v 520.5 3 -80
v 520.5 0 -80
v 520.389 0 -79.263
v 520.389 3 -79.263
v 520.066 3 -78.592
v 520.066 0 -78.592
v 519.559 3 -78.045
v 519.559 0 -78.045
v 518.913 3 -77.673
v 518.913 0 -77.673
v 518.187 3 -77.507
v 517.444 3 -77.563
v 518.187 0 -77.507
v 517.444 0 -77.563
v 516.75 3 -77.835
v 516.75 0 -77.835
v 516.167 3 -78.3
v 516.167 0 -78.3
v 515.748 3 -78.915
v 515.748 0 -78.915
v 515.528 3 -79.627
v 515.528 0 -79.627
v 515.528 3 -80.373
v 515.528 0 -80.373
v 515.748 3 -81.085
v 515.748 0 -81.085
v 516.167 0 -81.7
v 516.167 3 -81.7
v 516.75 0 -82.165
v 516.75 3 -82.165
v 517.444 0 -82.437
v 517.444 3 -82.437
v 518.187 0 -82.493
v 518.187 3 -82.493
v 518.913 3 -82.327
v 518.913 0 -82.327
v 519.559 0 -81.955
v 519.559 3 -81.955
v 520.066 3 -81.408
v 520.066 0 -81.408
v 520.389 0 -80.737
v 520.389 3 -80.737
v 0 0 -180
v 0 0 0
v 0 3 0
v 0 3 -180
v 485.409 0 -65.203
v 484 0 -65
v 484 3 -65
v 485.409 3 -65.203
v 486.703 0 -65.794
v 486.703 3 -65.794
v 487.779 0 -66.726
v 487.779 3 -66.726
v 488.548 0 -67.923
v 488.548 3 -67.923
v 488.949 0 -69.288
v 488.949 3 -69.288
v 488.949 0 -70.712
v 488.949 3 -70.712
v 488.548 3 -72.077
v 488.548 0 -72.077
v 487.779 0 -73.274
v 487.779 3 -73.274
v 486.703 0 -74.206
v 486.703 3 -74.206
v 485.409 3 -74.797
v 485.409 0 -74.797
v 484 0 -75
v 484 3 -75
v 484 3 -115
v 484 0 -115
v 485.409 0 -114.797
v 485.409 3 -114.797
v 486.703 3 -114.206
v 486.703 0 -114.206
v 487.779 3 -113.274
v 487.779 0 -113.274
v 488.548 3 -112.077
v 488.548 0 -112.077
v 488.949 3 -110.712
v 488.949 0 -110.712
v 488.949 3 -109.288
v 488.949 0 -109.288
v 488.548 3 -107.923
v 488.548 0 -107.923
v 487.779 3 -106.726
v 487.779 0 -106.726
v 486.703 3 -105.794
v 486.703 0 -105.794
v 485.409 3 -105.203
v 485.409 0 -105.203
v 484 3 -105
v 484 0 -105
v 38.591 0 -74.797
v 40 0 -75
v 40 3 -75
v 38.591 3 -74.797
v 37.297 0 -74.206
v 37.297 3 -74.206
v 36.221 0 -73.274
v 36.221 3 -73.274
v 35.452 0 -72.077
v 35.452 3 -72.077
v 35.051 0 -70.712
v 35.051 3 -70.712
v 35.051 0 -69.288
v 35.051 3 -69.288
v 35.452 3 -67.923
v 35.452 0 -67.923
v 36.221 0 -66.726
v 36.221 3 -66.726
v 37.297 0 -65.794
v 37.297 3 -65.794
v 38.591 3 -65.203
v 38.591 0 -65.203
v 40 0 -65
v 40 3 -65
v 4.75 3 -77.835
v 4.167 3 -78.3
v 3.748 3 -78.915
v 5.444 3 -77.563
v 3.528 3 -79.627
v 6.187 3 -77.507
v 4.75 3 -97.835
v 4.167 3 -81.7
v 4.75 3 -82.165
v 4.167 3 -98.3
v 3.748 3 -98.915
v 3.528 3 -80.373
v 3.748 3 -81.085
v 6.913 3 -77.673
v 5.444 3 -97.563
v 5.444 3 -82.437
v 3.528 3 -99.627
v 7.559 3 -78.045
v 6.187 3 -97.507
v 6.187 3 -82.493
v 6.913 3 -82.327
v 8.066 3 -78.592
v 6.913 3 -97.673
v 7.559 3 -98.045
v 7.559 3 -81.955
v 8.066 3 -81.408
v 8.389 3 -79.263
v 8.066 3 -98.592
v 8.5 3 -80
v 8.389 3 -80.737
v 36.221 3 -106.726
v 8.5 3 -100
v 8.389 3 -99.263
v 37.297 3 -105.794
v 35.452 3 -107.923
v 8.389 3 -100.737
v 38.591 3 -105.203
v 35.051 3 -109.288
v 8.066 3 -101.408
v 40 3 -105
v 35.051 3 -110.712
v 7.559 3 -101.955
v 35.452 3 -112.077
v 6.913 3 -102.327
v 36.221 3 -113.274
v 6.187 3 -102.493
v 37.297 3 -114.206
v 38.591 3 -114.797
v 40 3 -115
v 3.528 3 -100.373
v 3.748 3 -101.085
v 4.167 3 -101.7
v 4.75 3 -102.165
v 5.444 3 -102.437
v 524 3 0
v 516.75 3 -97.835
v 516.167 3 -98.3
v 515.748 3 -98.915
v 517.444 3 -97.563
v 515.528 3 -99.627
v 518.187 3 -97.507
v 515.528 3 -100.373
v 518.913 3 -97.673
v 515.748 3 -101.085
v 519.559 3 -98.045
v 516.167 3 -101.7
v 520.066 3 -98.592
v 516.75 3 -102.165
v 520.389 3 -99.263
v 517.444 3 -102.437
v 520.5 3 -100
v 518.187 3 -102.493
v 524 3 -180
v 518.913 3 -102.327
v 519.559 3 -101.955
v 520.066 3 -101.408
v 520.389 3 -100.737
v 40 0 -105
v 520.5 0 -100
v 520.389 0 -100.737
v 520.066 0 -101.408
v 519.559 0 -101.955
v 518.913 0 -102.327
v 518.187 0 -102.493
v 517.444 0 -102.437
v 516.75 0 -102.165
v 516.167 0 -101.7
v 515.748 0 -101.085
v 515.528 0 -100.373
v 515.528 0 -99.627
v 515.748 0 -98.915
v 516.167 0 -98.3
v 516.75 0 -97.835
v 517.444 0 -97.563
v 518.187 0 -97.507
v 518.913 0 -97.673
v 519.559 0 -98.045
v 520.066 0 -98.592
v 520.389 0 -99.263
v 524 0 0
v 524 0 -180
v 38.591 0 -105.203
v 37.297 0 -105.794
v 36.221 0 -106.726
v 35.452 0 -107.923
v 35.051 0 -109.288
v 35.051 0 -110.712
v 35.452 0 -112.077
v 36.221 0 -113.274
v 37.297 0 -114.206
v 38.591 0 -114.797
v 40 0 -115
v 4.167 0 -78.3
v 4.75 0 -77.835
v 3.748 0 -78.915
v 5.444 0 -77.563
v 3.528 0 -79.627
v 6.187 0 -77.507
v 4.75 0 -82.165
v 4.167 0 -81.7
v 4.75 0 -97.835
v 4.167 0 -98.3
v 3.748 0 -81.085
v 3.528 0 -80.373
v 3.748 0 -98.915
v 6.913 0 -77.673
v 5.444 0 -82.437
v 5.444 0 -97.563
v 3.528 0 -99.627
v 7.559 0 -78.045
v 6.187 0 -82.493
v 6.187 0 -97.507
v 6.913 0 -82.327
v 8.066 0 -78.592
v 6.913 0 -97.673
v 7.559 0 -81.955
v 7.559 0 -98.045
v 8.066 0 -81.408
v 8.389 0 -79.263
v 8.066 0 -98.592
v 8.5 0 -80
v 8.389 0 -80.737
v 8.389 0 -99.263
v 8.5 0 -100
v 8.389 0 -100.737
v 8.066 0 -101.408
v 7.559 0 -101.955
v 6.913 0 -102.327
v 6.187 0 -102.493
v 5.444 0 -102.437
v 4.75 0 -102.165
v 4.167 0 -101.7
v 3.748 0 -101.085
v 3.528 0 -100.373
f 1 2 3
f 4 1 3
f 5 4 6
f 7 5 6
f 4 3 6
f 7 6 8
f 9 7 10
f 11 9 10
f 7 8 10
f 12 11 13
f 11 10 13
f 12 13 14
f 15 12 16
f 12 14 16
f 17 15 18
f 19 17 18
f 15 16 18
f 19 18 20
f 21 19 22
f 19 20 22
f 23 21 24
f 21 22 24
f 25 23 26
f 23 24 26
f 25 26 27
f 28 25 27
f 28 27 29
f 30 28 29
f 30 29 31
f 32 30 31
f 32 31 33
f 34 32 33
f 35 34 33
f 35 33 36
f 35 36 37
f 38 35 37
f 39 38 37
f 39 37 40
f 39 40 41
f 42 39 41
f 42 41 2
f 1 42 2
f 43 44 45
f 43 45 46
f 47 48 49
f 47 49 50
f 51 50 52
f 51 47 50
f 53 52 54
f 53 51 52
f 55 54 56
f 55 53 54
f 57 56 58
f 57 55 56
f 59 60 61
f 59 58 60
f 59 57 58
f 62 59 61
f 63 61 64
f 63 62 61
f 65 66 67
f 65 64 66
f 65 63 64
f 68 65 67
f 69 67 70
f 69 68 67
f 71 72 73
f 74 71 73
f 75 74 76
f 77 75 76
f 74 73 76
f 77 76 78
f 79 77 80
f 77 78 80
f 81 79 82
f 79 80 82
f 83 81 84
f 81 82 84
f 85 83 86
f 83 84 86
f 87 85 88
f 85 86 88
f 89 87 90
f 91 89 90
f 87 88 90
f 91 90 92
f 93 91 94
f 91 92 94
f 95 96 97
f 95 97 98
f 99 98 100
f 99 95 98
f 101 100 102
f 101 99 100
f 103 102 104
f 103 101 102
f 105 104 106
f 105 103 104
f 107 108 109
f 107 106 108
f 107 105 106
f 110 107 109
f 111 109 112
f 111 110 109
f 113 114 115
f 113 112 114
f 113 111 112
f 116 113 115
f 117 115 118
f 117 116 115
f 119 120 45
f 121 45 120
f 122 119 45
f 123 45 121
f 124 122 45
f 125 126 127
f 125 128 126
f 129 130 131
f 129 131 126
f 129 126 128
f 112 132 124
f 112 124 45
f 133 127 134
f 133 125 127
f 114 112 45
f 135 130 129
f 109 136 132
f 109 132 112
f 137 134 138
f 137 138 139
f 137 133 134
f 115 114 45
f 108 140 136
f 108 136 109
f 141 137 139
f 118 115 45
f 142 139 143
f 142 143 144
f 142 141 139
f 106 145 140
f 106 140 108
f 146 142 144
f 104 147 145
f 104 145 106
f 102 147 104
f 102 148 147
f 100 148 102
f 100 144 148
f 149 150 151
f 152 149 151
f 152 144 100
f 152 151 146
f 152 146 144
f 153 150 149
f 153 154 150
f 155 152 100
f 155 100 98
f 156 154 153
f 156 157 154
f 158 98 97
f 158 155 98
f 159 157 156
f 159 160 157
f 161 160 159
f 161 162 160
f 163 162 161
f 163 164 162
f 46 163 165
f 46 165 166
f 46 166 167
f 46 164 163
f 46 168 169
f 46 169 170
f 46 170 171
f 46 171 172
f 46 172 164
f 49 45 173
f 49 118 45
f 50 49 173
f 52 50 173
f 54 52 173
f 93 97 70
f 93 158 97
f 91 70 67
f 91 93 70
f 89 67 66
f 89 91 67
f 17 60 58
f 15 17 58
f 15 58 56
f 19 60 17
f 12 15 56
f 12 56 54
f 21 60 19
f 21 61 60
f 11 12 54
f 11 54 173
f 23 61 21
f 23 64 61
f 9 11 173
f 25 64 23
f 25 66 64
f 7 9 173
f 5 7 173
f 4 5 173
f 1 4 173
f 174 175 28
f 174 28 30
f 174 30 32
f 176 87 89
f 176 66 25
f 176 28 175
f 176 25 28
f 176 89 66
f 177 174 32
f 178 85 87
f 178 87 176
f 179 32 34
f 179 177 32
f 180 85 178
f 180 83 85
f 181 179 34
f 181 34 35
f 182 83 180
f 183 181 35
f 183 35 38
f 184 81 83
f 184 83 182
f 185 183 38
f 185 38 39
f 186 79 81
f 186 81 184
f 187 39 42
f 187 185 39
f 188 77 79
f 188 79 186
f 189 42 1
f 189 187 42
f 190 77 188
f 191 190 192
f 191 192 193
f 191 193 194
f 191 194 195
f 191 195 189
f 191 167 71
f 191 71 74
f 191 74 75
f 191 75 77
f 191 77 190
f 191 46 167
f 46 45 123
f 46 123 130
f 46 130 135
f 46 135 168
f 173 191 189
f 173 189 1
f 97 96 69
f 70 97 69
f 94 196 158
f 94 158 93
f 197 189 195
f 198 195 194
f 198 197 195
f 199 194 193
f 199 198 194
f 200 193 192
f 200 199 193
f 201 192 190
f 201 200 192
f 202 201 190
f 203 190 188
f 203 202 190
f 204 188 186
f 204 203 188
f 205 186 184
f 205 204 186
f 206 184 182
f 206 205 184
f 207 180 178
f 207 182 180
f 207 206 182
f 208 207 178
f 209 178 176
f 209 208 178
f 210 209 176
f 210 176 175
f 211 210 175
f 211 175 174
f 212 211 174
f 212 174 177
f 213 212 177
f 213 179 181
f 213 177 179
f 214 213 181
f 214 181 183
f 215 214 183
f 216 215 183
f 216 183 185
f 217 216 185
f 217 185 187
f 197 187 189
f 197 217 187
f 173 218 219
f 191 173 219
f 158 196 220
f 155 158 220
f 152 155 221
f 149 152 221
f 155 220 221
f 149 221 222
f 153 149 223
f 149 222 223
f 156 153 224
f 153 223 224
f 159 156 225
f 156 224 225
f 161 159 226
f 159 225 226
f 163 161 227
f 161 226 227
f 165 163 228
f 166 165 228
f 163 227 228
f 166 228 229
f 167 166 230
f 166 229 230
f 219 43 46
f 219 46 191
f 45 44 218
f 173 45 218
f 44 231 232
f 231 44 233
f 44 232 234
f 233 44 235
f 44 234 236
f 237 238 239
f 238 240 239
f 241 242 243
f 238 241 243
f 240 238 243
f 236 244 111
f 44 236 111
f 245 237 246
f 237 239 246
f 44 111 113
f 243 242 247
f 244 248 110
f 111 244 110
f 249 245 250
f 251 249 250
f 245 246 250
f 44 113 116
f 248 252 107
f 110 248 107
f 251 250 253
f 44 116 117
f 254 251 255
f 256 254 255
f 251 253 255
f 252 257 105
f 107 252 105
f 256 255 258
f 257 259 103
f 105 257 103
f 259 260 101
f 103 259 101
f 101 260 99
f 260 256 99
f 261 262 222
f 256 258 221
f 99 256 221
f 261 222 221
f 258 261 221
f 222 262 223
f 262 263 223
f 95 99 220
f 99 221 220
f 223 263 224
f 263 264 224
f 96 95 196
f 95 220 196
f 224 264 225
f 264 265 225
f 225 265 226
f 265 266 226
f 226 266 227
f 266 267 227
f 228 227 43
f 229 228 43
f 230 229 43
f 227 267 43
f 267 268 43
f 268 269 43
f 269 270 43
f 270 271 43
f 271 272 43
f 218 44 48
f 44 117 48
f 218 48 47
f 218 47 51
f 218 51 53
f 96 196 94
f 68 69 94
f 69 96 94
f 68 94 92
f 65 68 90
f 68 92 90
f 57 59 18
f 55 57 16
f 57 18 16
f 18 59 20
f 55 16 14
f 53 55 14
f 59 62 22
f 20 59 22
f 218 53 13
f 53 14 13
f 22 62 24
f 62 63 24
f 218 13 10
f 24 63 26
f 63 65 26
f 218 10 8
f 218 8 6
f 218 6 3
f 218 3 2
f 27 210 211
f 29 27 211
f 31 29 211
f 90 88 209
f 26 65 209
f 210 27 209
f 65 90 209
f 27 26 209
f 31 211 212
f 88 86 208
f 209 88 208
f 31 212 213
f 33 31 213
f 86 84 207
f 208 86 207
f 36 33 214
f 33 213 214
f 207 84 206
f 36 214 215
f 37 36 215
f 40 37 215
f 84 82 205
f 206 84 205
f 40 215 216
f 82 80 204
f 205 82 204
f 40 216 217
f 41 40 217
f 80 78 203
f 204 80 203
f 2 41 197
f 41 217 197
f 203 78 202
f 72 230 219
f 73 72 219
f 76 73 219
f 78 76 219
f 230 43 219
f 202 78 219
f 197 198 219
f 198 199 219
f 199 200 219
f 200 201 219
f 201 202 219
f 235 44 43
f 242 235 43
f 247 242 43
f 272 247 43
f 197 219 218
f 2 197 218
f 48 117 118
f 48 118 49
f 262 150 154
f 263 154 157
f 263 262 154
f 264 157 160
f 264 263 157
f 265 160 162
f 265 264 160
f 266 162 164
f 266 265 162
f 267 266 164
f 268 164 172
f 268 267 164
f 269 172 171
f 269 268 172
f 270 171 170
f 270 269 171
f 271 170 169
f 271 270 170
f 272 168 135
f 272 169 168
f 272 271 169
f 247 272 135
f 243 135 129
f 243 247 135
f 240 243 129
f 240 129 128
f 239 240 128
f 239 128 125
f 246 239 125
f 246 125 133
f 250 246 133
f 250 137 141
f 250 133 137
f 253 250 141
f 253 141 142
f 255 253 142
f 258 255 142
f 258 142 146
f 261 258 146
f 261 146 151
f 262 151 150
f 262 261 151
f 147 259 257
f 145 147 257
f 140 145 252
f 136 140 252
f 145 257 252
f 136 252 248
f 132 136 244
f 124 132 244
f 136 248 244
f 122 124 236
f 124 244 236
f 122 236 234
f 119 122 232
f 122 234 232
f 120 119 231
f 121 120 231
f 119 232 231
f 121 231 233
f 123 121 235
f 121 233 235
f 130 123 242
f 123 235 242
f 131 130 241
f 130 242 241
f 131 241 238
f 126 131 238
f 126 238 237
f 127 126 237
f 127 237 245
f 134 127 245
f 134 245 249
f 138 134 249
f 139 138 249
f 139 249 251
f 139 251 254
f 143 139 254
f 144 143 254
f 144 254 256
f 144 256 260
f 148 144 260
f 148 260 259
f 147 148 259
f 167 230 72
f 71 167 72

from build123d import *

# Parameters (mm, degrees)
SKETCH1_W                  = 524
SKETCH1_H                  = 180
BOSS_EXTRUDE1_DEPTH        = 3
SKETCH2_W                  = 444
SKETCH2_H                  = 10
TRACKS_DEPTH               = 4
SKETCH3_R                  = 2.5
SCREW_MOUNTING_HOLES_DEPTH = 4


with BuildPart() as part:
    # Sketch1 → Boss-Extrude1 (new body)
    with BuildSketch(Plane(origin=(0, 0, 0), x_dir=(1, 0, 0), z_dir=(0, 1, 0))):
        with Locations((262, 90)):
            Rectangle(SKETCH1_W, SKETCH1_H)
    extrude(amount=BOSS_EXTRUDE1_DEPTH)

    # Sketch2 → Tracks (cut, through all)
    with BuildSketch(Plane.XZ):
        with BuildLine():
            ThreePointArc((484, -65), (489, -70), (484, -75))
            Line((484, -75), (484, -65))
        make_face()
        with Locations((262, -70)):
            Rectangle(SKETCH2_W, SKETCH2_H)
        with BuildLine():
            ThreePointArc((40, -75), (35, -70), (40, -65))
            Line((40, -65), (40, -75))
        make_face()
    tracks = extrude(amount=-TRACKS_DEPTH, mode=Mode.SUBTRACT)

    # Sketch3 → screw mounting holes (cut, through all)
    with BuildSketch(Plane.XZ):
        with Locations((6, -80)):
            Circle(SKETCH3_R)
        with Locations((518, -80)):
            Circle(SKETCH3_R)
    screw_mounting_holes = extrude(amount=-SCREW_MOUNTING_HOLES_DEPTH, mode=Mode.SUBTRACT)

    # Mirror2: Tracks, screw mounting holes across plane
    add(tracks.mirror(Plane(origin=(0, 0, -90), x_dir=(1, 0, 0), z_dir=(0, 0, -1))), mode=Mode.SUBTRACT)
    add(screw_mounting_holes.mirror(Plane(origin=(0, 0, -90), x_dir=(1, 0, 0), z_dir=(0, 0, -1))), mode=Mode.SUBTRACT)


solid = part.part
